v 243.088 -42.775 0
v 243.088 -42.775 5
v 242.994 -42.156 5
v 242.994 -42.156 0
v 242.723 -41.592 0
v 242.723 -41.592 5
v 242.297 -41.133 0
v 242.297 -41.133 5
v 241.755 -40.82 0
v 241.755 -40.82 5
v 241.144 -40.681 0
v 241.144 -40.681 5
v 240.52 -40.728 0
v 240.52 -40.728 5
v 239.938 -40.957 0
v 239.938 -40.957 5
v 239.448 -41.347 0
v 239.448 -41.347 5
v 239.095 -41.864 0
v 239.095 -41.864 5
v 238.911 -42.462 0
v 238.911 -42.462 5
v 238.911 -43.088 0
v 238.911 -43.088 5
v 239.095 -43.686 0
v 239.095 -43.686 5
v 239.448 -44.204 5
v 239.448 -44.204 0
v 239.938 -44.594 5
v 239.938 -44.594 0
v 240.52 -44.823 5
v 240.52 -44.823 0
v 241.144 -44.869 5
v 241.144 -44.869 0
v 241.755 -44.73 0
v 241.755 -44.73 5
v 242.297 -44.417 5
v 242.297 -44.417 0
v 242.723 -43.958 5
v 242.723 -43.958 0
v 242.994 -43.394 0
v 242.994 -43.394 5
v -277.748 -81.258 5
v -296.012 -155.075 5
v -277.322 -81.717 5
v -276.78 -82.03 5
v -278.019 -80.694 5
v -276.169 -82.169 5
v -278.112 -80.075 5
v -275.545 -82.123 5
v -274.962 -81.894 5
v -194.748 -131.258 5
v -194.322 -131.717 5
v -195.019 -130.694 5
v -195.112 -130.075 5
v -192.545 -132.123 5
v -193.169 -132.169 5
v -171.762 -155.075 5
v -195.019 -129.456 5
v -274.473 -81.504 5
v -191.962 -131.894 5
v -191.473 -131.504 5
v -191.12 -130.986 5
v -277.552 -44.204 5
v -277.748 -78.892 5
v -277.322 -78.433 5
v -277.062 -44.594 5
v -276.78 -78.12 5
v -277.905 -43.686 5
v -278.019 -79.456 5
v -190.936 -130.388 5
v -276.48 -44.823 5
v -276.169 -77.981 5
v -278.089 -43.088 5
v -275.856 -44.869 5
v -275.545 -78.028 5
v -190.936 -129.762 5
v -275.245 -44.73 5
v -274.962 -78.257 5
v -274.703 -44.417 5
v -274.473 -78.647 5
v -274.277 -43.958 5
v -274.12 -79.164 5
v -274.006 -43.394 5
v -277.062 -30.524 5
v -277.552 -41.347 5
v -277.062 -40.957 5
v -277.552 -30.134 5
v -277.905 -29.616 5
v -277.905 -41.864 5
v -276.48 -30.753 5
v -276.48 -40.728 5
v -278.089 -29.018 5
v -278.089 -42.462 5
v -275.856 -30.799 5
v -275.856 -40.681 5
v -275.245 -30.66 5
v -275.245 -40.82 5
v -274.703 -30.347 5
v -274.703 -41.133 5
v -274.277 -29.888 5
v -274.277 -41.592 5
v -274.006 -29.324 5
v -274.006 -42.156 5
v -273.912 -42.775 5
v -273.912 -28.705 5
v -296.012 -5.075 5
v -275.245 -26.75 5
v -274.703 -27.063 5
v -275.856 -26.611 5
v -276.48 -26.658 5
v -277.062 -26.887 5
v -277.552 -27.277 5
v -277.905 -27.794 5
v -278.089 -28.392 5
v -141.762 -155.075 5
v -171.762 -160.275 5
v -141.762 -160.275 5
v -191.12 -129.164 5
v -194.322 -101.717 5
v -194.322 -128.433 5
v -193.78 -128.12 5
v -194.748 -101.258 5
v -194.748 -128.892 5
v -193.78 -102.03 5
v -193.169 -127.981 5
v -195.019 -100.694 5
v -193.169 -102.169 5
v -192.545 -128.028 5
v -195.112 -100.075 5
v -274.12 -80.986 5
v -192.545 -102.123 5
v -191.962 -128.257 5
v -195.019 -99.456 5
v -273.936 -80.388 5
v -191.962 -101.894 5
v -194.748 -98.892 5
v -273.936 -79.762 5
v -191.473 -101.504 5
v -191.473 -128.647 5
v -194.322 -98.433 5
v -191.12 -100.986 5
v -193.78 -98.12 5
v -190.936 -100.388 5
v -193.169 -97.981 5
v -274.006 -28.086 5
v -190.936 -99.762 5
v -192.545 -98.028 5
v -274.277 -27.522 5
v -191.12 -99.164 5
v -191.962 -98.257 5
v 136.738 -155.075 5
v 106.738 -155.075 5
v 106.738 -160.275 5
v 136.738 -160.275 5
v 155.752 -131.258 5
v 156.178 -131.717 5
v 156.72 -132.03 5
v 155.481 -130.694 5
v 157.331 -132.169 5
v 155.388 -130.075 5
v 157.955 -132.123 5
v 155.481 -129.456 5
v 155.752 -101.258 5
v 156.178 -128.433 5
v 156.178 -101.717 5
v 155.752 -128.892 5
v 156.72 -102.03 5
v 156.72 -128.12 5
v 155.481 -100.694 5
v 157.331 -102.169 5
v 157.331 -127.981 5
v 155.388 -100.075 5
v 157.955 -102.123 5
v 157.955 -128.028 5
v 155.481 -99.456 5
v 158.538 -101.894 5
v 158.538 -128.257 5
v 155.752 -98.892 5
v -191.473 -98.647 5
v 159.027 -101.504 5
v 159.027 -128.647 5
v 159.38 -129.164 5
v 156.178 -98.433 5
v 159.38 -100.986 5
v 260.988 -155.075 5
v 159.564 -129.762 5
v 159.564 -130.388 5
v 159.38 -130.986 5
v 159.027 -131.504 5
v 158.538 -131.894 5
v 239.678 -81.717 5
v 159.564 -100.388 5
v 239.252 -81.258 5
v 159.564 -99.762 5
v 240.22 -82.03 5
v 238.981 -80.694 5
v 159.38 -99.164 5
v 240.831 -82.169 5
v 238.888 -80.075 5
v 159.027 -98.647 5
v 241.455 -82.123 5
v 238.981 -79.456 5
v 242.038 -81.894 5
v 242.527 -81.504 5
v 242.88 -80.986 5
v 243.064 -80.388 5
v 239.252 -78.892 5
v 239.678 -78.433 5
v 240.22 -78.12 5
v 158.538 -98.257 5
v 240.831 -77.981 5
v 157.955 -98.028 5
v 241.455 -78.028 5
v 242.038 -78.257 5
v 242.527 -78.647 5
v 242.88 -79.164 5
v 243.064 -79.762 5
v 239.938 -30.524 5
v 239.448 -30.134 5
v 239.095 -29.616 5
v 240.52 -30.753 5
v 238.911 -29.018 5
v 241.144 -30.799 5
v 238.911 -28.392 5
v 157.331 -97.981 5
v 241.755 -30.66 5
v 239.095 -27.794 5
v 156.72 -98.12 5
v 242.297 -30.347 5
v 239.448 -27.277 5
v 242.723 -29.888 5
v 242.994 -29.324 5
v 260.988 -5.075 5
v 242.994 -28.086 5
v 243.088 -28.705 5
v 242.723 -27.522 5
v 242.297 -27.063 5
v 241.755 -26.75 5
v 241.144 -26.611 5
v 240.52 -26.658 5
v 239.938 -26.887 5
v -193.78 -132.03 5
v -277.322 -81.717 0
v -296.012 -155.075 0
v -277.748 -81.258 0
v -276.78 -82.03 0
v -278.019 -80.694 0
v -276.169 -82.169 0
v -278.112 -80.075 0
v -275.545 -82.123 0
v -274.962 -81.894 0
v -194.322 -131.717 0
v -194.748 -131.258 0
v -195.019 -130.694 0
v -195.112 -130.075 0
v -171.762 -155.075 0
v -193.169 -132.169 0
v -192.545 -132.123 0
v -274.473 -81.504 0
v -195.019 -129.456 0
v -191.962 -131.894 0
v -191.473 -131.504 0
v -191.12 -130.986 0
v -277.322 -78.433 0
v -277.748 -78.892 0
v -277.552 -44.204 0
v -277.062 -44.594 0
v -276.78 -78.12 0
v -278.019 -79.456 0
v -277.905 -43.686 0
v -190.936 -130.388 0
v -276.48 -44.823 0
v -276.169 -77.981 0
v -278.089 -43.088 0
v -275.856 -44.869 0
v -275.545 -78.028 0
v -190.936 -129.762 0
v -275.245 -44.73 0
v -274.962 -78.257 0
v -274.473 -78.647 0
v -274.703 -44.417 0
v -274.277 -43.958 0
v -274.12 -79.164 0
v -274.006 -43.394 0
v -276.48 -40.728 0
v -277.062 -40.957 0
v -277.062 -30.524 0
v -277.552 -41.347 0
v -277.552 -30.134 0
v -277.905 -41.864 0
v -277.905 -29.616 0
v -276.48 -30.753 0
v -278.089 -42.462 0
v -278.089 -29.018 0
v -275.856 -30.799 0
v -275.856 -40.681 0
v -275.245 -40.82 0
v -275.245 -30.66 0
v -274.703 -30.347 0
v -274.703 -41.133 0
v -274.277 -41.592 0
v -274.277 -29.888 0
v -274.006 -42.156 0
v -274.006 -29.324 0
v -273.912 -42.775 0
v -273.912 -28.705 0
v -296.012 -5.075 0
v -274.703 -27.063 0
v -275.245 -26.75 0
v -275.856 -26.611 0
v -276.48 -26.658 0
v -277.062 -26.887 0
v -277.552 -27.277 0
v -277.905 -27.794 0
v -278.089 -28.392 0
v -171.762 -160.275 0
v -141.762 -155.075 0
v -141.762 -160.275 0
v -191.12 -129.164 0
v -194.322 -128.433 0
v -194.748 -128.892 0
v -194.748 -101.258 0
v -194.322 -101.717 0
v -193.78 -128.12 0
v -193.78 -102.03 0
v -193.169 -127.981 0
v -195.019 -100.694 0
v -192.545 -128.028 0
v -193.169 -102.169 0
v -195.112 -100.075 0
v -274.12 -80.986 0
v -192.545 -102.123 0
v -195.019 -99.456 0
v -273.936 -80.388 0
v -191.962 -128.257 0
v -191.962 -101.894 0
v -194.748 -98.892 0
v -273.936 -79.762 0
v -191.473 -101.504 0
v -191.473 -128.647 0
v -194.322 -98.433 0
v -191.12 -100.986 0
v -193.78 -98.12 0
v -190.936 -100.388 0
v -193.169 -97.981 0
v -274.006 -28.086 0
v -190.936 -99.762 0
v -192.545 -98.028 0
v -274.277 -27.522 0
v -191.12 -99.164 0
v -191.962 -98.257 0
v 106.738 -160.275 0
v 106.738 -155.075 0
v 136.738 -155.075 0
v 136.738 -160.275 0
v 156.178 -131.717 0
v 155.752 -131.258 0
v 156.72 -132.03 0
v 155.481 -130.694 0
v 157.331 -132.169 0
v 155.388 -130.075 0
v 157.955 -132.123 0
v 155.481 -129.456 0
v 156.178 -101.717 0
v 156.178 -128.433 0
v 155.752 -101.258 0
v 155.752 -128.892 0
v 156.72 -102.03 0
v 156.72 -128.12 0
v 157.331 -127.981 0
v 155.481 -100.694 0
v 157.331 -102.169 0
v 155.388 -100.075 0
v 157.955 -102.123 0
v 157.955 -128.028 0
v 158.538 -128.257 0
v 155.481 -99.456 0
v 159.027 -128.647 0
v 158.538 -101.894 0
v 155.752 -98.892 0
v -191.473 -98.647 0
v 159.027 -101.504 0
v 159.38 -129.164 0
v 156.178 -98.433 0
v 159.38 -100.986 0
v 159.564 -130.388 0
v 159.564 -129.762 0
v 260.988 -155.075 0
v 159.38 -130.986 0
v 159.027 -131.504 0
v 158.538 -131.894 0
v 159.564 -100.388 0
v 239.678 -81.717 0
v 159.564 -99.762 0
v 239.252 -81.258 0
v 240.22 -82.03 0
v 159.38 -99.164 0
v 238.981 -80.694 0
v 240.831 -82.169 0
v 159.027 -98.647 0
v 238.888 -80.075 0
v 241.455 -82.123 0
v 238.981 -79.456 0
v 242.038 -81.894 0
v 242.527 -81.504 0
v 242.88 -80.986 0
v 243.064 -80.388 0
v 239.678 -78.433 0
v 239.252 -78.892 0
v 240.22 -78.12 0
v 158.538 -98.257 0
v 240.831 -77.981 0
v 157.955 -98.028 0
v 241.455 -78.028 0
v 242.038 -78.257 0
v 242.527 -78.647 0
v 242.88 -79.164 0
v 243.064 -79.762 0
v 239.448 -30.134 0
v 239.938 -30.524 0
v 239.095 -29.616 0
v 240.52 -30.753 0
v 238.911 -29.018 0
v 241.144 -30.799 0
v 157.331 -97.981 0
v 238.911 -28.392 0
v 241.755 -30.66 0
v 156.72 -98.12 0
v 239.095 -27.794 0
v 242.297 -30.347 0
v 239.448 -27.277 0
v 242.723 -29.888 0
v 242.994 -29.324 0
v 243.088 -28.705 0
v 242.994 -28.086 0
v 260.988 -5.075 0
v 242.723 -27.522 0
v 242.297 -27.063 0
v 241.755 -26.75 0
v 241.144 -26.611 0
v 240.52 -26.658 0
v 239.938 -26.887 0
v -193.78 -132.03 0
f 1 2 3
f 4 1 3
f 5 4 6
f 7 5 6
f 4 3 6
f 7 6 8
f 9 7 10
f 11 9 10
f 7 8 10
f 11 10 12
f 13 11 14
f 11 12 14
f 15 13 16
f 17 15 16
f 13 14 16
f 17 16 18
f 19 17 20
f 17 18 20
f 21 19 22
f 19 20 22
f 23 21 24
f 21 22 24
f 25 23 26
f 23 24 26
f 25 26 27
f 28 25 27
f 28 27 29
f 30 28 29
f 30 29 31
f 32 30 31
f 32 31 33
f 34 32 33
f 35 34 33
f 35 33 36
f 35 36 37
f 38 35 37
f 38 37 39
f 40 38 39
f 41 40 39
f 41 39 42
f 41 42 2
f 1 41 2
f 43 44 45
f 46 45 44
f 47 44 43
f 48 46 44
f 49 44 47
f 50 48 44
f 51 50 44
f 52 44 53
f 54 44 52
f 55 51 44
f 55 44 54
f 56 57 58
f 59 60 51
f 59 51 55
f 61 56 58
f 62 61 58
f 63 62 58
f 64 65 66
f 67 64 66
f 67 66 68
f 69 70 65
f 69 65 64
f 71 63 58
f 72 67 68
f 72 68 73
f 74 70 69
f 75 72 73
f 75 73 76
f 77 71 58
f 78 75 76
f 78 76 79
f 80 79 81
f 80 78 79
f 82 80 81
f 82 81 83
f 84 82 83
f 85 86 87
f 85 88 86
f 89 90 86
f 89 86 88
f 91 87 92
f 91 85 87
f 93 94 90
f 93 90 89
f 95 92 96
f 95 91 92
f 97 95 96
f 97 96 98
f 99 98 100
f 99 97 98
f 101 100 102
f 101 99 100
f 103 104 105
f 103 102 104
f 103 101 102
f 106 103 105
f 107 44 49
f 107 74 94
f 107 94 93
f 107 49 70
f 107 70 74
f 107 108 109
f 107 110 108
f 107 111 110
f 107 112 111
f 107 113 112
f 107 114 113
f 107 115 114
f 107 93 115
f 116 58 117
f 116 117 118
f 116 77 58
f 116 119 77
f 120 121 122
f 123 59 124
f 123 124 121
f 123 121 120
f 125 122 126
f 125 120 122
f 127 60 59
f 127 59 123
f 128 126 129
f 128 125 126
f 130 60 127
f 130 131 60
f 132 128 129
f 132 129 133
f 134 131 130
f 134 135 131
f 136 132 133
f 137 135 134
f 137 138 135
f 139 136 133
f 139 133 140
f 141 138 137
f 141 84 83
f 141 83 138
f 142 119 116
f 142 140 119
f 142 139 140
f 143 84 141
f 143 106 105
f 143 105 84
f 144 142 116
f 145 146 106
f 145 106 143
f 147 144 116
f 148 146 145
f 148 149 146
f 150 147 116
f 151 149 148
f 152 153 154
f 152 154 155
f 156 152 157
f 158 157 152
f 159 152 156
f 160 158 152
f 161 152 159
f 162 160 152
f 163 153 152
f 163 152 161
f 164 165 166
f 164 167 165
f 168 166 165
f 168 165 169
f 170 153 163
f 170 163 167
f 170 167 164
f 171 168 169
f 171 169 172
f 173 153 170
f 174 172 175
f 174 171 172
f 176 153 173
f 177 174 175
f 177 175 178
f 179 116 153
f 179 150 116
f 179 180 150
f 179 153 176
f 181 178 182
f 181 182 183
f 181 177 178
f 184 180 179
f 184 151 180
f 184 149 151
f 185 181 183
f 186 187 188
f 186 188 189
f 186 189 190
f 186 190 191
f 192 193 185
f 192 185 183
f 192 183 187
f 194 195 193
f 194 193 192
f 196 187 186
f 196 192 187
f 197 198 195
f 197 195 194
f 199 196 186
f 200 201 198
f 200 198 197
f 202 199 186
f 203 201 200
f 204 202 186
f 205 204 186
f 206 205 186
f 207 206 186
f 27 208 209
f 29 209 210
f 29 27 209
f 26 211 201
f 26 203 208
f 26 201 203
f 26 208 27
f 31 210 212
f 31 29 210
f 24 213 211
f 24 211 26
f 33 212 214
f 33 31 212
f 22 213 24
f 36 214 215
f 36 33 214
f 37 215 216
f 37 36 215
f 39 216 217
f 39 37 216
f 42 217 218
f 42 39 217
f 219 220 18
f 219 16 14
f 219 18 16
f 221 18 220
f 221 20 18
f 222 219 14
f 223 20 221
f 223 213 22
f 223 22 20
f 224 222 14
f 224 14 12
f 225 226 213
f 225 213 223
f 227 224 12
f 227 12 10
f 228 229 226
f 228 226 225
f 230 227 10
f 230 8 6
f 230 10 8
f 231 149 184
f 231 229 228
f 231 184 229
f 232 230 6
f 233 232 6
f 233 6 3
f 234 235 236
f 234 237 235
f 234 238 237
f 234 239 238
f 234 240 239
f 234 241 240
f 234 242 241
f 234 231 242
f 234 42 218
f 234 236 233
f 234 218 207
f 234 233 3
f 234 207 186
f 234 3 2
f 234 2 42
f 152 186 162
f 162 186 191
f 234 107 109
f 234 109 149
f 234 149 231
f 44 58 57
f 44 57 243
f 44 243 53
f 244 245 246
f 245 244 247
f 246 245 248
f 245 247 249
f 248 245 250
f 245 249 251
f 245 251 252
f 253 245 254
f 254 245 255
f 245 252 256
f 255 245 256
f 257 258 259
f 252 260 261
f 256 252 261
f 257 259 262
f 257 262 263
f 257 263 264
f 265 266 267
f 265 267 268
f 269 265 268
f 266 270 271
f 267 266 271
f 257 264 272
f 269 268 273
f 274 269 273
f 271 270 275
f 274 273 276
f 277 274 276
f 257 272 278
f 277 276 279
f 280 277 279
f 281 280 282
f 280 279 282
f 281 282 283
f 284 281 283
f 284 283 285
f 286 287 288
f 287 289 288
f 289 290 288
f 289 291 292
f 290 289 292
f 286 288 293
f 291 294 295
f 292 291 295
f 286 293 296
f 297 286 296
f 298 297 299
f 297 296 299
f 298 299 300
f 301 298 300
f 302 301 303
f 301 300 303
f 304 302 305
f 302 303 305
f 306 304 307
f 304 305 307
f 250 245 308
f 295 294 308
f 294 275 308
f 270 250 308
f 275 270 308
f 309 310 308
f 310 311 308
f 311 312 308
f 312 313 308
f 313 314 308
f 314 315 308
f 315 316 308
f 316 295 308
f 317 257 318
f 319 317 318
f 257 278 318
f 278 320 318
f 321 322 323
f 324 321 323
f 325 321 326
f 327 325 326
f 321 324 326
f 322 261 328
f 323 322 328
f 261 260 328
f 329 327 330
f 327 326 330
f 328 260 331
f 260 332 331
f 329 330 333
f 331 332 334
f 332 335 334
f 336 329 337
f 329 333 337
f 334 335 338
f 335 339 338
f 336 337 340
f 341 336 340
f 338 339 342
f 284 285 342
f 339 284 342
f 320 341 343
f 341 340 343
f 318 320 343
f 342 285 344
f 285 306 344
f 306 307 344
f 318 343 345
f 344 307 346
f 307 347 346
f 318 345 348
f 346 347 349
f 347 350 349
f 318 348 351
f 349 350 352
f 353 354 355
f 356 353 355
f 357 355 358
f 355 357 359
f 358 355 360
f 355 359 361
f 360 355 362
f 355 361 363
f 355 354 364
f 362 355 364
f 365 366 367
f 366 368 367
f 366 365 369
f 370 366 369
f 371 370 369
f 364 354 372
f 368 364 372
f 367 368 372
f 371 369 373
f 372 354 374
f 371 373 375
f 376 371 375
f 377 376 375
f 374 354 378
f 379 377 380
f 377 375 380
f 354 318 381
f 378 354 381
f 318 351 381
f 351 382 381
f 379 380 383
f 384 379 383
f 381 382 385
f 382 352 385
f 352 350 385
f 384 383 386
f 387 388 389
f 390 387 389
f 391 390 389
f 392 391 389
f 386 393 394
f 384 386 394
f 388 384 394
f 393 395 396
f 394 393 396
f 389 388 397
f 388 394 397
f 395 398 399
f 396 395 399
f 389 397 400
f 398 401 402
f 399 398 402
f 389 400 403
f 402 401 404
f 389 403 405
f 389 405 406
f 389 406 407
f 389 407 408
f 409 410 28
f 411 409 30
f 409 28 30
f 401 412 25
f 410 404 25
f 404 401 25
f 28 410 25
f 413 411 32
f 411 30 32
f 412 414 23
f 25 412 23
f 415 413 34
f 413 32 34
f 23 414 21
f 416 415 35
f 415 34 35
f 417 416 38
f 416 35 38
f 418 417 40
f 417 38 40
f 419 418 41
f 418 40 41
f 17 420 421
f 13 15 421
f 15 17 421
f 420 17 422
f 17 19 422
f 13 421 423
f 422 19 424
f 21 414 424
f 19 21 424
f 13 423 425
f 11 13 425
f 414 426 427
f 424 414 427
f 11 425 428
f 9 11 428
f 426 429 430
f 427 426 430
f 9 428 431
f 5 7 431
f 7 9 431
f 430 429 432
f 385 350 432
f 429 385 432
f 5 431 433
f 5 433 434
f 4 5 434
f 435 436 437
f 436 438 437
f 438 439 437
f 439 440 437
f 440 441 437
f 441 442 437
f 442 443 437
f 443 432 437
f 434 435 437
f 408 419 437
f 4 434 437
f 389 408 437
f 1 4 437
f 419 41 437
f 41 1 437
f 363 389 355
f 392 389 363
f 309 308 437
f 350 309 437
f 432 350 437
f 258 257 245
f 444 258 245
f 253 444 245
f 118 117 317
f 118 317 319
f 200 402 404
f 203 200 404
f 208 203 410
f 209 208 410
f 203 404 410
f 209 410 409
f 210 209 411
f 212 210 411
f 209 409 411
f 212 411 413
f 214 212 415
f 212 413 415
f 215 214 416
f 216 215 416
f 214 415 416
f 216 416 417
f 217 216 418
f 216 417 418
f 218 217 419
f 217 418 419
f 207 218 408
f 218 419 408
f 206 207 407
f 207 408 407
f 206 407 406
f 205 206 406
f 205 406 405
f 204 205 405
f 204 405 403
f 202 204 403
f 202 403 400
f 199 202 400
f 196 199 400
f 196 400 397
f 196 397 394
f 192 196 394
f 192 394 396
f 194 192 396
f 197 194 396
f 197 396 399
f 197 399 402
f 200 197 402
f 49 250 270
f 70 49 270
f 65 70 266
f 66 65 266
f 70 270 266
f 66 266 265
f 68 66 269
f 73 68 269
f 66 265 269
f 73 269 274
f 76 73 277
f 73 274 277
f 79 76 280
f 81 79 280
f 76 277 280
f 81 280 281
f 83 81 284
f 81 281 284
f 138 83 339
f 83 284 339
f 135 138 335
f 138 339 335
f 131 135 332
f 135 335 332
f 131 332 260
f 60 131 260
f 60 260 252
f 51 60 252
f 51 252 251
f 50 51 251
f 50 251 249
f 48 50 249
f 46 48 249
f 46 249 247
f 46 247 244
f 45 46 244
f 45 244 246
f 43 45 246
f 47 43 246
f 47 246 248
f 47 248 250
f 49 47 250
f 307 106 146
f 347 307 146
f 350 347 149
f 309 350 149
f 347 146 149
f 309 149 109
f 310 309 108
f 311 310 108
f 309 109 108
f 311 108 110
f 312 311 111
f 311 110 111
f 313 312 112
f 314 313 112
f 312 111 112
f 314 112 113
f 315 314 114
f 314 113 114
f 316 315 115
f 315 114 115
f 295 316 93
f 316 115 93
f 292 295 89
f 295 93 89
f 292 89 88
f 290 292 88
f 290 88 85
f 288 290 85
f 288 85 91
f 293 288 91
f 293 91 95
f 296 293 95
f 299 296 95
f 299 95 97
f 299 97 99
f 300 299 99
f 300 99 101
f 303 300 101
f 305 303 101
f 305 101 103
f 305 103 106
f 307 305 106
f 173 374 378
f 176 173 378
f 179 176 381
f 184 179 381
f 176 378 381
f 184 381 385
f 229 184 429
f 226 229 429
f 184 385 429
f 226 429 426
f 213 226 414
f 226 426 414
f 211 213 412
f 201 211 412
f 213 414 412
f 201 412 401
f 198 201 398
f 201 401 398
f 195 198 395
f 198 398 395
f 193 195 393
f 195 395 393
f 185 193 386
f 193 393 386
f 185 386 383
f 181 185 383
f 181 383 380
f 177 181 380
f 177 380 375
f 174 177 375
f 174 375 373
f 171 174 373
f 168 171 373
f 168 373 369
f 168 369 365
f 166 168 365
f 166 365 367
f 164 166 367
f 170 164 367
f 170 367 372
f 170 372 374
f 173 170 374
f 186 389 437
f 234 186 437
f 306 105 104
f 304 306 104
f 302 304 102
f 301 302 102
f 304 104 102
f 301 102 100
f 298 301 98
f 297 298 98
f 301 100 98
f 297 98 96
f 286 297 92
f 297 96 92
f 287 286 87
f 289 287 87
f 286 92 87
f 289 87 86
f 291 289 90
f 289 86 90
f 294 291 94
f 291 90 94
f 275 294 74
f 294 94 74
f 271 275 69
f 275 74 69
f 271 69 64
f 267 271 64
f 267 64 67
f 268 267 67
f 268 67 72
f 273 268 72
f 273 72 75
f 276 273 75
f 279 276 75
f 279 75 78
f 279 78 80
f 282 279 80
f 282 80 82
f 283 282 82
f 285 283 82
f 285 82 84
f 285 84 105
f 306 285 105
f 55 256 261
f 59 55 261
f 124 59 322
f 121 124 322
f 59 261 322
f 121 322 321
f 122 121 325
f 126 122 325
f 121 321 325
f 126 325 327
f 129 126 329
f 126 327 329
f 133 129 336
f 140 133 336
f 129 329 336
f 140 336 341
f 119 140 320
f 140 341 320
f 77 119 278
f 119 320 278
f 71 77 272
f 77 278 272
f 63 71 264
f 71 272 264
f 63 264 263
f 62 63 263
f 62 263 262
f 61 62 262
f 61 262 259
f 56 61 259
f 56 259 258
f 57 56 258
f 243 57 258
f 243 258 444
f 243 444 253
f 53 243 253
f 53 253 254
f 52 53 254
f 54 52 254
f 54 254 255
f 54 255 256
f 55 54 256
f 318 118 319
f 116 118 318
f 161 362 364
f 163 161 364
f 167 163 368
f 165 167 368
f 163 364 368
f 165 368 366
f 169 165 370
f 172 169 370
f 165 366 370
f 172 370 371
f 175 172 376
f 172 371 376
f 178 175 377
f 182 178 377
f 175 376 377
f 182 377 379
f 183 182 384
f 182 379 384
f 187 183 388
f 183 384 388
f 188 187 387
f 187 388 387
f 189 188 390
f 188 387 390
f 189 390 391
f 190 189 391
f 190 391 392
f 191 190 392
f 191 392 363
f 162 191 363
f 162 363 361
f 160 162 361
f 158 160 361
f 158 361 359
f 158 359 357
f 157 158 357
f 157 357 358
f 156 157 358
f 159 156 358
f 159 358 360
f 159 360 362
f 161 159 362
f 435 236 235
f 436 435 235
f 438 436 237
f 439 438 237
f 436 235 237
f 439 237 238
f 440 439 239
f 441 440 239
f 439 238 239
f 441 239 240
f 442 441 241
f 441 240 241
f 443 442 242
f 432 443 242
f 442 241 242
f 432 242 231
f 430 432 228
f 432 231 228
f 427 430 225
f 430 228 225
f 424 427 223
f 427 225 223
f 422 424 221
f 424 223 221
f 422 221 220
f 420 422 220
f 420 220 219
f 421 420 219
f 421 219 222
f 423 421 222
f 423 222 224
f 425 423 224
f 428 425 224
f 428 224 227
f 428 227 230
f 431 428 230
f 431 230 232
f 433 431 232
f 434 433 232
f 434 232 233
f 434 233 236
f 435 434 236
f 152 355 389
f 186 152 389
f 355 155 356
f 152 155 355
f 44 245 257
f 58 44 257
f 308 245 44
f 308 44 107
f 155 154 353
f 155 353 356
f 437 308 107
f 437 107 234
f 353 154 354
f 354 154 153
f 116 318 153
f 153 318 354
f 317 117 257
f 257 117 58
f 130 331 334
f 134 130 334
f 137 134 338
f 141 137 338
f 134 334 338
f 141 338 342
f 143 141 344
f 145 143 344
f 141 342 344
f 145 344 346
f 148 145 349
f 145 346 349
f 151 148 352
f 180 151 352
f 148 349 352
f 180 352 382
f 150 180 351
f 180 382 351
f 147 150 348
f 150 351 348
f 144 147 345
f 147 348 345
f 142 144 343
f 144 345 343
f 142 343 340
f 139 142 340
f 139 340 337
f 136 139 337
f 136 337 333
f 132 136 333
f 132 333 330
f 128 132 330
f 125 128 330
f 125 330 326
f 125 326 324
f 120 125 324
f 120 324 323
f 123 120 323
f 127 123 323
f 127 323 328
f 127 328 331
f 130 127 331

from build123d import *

# Parameters (mm, degrees)
SKETCH1_W           = 557
SKETCH1_H           = 150
BOSS_EXTRUDE1_DEPTH = 5
SKETCH2_W           = 30
SKETCH2_H           = 10.4
BOSS_EXTRUDE2_DEPTH = 5
SKETCH3_R           = 2.1
CUT_EXTRUDE1_DEPTH  = 10
SKETCH4_R           = 2.1
CUT_EXTRUDE2_DEPTH  = 10
SKETCH5_R           = 2.1
CUT_EXTRUDE3_DEPTH  = 10
SKETCH6_R           = 2.1
CUT_EXTRUDE4_DEPTH  = 10


with BuildPart() as part:
    # Sketch1 → Boss-Extrude1 (new body)
    with BuildSketch(Plane.XY):
        with Locations((-17.512478204, -80.075206465)):
            Rectangle(SKETCH1_W, SKETCH1_H)
    extrude(amount=BOSS_EXTRUDE1_DEPTH)

    # Sketch2 → Boss-Extrude2 (add)
    with BuildSketch(Plane.XY.offset(5)):
        with Locations((-156.762478204, -155.075206465)):
            Rectangle(SKETCH2_W, SKETCH2_H)
        with Locations((121.737521796, -155.075206465)):
            Rectangle(SKETCH2_W, SKETCH2_H)
    extrude(amount=-BOSS_EXTRUDE2_DEPTH)

    # Sketch3 → Cut-Extrude1 (cut)
    with BuildSketch(Plane.XY.offset(5)):
        with Locations((-276.012478204, -28.705206465)):
            Circle(SKETCH3_R)
        with Locations((-276.012478204, -42.775206465)):
            Circle(SKETCH3_R)
        with Locations((240.987521796, -42.775206465)):
            Circle(SKETCH3_R)
        with Locations((240.987521796, -28.705206465)):
            Circle(SKETCH3_R)
    extrude(amount=-CUT_EXTRUDE1_DEPTH, mode=Mode.SUBTRACT)

    # Sketch4 → Cut-Extrude2 (cut)
    with BuildSketch(Plane(origin=(0, 0, 0), x_dir=(-1, 0, 0), z_dir=(0, 0, -1))):
        with Locations((-240.987521796, -80.075206465)):
            Circle(SKETCH4_R)
        with Locations((276.012478204, -80.075206465)):
            Circle(SKETCH4_R)
    extrude(amount=-CUT_EXTRUDE2_DEPTH, mode=Mode.SUBTRACT)

    # Sketch5 → Cut-Extrude3 (cut)
    with BuildSketch(Plane(origin=(0, 0, 0), x_dir=(-1, 0, 0), z_dir=(0, 0, -1))):
        with Locations((-157.487521796, -130.075206465)):
            Circle(SKETCH5_R)
        with Locations((-157.487521796, -100.075206465)):
            Circle(SKETCH5_R)
    extrude(amount=-CUT_EXTRUDE3_DEPTH, mode=Mode.SUBTRACT)

    # Sketch6 → Cut-Extrude4 (cut)
    with BuildSketch(Plane(origin=(0, 0, 0), x_dir=(-1, 0, 0), z_dir=(0, 0, -1))):
        with Locations((193.012478204, -130.075206465)):
            Circle(SKETCH6_R)
        with Locations((193.012478204, -100.075206465)):
            Circle(SKETCH6_R)
    extrude(amount=-CUT_EXTRUDE4_DEPTH, mode=Mode.SUBTRACT)


solid = part.part
